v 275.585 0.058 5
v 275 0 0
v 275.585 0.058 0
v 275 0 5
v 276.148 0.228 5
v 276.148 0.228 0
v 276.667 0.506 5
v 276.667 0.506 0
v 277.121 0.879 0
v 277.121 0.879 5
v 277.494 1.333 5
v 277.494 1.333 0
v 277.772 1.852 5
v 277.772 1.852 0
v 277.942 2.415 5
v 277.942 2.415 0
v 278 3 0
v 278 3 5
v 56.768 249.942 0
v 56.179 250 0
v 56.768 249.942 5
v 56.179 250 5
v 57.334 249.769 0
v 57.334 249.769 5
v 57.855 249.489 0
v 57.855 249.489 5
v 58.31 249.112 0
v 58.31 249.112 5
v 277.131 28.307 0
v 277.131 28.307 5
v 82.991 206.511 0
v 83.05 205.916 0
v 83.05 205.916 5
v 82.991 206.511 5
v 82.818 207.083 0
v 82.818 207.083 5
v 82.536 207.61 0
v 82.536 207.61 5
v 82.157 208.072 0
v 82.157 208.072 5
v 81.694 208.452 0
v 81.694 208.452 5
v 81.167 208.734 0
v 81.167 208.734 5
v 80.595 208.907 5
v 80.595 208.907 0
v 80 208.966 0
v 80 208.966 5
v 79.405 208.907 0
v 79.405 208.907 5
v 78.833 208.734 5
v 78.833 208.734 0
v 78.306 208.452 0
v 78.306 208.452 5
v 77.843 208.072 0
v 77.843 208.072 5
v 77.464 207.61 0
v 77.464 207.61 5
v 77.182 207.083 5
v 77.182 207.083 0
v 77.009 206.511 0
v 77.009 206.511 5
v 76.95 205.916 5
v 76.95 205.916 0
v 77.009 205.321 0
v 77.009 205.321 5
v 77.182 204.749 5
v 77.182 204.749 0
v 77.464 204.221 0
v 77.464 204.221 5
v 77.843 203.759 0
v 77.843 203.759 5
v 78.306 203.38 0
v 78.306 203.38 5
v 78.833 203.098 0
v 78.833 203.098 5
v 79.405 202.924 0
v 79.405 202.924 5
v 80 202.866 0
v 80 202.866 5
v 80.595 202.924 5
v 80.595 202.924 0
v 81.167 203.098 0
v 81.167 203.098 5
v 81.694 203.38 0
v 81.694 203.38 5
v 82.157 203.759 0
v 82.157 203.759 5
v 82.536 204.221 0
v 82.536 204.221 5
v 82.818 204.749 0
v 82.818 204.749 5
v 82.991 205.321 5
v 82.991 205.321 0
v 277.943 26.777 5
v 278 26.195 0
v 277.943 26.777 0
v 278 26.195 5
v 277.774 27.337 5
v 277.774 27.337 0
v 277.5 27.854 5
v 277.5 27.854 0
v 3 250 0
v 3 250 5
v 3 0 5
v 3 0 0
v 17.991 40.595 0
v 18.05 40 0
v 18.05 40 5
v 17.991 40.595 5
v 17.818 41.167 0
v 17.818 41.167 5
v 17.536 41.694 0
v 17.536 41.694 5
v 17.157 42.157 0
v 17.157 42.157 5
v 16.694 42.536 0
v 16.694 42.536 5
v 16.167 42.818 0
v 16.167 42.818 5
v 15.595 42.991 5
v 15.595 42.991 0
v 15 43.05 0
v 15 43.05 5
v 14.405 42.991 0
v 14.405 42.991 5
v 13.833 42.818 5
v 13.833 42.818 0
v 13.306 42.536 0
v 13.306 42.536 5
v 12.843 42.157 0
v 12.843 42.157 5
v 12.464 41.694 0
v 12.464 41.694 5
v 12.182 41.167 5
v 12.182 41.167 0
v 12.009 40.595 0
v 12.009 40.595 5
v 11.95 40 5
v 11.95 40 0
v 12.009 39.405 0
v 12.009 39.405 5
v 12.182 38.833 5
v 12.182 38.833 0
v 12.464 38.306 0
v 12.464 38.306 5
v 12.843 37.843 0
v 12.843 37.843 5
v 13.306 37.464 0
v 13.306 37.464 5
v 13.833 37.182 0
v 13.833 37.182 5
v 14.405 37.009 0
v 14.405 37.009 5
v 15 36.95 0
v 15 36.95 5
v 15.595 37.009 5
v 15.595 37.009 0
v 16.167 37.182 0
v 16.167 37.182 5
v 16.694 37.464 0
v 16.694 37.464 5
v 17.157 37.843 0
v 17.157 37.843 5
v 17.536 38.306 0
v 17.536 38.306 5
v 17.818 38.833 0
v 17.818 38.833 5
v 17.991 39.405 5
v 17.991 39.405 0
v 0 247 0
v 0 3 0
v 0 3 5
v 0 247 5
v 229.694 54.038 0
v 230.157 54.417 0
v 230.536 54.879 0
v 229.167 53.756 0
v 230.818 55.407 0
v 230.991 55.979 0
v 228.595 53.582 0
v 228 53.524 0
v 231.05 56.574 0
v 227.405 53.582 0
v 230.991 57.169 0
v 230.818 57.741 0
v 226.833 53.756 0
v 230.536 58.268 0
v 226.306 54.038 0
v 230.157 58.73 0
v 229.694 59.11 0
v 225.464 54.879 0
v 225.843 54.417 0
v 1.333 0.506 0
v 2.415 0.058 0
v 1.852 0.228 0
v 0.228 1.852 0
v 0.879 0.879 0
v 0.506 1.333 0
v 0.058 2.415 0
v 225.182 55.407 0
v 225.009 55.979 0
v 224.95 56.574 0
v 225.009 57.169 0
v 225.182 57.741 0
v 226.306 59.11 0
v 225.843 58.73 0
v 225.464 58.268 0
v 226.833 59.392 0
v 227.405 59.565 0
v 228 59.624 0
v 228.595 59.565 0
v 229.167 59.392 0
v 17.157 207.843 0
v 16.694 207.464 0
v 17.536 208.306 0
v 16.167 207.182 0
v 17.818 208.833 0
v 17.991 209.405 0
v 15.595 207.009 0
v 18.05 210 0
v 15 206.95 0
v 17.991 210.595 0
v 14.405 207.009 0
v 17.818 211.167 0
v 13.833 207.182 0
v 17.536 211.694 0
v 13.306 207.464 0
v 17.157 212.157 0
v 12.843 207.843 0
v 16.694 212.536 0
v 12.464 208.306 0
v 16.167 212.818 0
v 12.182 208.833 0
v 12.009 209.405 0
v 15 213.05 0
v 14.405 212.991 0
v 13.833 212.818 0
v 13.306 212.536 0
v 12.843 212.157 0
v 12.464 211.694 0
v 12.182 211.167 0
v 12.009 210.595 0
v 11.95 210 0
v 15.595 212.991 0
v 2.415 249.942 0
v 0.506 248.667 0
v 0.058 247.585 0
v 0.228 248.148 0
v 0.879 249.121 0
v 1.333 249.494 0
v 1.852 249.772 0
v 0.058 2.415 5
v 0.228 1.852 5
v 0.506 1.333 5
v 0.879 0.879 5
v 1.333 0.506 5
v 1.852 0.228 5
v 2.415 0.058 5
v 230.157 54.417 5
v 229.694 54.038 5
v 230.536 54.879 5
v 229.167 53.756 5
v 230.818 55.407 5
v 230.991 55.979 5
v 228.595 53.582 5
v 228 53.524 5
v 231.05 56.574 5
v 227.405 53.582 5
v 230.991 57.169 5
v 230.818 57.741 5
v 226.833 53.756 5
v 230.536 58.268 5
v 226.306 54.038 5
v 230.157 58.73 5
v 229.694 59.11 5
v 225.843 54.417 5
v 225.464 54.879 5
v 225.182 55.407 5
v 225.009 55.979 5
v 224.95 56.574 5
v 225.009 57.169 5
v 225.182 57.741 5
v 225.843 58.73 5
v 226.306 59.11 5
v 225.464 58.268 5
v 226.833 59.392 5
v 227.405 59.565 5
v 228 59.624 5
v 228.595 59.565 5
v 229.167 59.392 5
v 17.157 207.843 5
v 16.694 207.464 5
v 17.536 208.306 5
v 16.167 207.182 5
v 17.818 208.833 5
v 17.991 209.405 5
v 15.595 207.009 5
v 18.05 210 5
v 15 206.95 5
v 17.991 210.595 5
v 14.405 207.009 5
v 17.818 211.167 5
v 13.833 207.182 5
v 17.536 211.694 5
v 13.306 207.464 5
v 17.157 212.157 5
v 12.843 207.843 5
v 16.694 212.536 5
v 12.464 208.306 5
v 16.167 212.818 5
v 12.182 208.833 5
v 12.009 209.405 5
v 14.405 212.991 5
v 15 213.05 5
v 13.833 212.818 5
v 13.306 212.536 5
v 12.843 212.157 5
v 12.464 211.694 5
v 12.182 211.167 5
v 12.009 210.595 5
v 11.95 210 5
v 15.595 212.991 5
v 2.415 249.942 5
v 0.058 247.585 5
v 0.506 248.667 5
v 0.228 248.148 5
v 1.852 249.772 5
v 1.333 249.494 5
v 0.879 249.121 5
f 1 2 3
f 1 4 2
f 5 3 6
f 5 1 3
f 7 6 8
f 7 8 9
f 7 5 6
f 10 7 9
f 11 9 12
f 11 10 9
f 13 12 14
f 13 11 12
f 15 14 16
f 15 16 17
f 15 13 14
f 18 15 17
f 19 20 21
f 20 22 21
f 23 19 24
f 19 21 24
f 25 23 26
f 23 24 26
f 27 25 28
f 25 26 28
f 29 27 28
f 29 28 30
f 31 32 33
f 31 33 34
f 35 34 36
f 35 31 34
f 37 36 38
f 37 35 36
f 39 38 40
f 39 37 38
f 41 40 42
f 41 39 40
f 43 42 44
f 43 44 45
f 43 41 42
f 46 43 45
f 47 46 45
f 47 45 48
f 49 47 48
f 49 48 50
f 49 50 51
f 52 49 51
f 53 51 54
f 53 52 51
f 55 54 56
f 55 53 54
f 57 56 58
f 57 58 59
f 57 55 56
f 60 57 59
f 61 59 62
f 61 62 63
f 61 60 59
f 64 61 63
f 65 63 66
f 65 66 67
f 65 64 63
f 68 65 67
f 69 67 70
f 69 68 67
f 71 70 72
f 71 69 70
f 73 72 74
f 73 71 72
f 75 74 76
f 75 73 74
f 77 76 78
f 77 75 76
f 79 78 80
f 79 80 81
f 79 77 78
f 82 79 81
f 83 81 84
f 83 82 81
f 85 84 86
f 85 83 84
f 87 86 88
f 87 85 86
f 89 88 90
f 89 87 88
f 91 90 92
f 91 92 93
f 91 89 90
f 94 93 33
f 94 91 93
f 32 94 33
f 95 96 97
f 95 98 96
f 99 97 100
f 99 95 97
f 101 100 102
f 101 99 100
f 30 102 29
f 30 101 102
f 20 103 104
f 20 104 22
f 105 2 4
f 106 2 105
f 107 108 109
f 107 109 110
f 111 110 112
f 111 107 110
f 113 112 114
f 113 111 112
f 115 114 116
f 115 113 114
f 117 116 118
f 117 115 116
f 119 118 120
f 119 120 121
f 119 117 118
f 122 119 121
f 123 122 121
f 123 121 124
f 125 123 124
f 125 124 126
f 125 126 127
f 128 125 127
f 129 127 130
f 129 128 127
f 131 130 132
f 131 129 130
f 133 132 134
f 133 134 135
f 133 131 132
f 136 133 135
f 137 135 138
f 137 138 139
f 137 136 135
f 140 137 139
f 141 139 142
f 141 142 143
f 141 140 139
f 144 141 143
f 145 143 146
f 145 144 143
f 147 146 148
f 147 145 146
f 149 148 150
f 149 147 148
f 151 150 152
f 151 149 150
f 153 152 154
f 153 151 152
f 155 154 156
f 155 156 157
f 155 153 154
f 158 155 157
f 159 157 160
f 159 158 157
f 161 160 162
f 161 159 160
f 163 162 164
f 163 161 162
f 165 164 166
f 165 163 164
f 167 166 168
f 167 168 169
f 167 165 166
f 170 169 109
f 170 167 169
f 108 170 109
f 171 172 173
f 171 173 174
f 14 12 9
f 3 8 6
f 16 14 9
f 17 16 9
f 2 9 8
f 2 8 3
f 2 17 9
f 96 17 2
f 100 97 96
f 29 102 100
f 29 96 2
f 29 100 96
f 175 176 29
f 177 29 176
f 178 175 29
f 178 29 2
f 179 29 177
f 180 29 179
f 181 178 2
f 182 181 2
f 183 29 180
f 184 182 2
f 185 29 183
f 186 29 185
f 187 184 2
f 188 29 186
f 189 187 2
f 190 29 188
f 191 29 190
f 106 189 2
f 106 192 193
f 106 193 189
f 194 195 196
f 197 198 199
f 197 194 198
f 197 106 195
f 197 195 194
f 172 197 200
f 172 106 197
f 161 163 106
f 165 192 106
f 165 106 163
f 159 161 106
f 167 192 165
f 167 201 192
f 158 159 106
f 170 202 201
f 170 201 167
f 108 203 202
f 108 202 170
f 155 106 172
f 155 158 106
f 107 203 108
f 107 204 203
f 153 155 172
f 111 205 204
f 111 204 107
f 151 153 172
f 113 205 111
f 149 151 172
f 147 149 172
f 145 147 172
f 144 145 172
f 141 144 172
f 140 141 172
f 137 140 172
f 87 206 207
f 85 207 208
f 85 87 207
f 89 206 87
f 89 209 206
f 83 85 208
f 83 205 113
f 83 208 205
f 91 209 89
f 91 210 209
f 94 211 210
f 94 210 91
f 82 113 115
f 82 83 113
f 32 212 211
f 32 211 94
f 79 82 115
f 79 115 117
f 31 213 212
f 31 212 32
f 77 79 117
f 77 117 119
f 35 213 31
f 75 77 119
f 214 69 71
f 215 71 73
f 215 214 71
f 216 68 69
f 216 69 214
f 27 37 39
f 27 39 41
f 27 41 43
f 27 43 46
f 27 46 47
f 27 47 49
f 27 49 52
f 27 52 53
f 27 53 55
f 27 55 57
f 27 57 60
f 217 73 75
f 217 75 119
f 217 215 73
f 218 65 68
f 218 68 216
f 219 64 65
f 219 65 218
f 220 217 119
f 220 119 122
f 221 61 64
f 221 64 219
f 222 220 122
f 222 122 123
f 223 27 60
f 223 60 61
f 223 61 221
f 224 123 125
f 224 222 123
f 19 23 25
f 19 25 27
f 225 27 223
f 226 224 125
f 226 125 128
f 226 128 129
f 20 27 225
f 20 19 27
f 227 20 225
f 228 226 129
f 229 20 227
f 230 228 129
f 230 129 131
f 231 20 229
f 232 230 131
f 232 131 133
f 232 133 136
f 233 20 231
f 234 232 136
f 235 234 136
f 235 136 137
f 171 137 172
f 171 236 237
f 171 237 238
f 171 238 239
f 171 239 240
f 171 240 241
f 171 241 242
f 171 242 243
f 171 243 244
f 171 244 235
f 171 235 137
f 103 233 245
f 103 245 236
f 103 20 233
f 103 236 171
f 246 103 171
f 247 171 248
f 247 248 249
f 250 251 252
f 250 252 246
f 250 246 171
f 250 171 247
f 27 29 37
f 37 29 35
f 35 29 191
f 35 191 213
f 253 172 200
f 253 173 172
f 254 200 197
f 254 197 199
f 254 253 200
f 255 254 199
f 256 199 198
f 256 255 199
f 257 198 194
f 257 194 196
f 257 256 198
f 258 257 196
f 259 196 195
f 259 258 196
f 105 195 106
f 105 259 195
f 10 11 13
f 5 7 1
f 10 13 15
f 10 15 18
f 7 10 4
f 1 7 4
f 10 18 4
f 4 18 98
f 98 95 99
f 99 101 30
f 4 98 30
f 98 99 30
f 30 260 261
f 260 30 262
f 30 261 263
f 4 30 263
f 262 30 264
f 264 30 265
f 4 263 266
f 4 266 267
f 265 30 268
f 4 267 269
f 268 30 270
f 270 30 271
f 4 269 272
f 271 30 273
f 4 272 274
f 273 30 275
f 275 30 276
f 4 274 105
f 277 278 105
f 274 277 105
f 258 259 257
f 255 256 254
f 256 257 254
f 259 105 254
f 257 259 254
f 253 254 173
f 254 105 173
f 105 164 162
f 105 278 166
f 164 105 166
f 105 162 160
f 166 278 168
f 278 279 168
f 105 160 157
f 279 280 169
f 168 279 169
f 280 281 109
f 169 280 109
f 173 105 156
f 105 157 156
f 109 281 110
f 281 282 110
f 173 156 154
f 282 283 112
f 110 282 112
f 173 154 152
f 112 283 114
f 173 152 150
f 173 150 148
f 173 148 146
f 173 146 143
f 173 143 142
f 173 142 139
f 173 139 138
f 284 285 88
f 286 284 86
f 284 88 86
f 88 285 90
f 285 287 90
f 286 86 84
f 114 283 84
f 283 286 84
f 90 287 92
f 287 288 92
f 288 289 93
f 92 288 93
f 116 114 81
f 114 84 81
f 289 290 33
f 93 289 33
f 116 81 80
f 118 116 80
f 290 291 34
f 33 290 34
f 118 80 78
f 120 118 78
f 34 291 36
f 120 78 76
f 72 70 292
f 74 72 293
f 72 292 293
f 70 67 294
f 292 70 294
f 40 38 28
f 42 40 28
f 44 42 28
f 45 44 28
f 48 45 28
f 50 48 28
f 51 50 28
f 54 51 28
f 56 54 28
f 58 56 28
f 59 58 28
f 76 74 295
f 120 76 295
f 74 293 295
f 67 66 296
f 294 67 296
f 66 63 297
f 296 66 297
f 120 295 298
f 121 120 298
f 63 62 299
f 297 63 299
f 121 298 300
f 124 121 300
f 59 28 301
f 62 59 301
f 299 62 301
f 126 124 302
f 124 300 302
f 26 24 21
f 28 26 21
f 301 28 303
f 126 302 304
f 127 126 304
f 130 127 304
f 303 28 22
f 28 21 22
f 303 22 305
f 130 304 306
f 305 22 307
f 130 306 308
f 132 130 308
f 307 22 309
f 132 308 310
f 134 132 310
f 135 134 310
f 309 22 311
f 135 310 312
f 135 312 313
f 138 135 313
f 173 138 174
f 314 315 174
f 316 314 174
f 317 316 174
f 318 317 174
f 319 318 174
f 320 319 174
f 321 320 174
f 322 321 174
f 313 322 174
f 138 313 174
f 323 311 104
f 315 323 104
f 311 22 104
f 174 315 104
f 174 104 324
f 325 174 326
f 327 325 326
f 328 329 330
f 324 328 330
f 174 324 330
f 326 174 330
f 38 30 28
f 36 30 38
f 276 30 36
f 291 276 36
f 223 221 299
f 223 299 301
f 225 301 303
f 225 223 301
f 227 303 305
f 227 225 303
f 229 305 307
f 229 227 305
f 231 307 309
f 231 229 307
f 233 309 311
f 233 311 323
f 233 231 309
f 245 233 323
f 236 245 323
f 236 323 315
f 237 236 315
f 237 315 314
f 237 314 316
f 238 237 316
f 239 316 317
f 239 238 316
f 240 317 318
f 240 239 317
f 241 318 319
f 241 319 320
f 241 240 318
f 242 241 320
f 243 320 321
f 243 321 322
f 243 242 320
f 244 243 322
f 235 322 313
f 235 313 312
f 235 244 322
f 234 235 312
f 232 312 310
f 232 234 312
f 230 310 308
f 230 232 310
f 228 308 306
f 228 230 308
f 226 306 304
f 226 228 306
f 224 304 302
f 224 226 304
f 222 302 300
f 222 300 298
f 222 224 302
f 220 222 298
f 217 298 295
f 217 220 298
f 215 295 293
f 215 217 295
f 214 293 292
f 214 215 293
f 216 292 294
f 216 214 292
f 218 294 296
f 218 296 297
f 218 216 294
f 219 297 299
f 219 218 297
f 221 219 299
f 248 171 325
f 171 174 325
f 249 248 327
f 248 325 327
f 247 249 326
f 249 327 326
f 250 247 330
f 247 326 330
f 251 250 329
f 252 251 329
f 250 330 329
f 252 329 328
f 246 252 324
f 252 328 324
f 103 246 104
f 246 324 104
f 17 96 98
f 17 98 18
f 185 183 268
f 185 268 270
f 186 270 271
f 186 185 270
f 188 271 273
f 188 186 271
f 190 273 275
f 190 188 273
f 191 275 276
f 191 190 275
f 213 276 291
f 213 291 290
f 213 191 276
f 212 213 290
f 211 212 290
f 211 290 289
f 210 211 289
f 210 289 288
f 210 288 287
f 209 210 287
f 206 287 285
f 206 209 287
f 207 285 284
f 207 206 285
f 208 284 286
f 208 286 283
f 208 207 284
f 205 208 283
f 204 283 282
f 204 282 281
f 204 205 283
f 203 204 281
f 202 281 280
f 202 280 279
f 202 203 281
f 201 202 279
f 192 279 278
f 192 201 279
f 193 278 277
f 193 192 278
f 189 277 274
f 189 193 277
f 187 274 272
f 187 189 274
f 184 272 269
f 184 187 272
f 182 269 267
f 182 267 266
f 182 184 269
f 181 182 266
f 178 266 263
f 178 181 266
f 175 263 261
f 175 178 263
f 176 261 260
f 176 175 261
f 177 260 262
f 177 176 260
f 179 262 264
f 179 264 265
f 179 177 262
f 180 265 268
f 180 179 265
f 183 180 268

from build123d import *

# Parameters (mm, degrees)
SKETCH1_R           = 3.05
BOSS_EXTRUDE1_DEPTH = 5
FILLET1_R           = 3


with BuildPart() as part:
    # Sketch1 → Boss-Extrude1 (new body)
    with BuildSketch(Plane.XY):
        Polygon((0, 0), (0, 250), (57.43, 250), (278, 27.43), (278, 0), align=None)
        with Locations((15, 210)):
            Circle(SKETCH1_R, mode=Mode.SUBTRACT)
        with Locations((15, 40)):
            Circle(SKETCH1_R, mode=Mode.SUBTRACT)
        with Locations((80, 205.915753479)):
            Circle(SKETCH1_R, mode=Mode.SUBTRACT)
        with Locations((228, 56.573775875)):
            Circle(SKETCH1_R, mode=Mode.SUBTRACT)
    extrude(amount=BOSS_EXTRUDE1_DEPTH)

    # Fillet1
    fillet1_edges = [part.edges().sort_by_distance(p)[0] for p in [
        (0, 0, 2.5),
        (0, 250, 2.5),
        (57.43, 250, 2.5),
        (278, 27.43, 2.5),
        (278, 0, 2.5),
    ]]
    fillet(fillet1_edges, radius=FILLET1_R)


solid = part.part
